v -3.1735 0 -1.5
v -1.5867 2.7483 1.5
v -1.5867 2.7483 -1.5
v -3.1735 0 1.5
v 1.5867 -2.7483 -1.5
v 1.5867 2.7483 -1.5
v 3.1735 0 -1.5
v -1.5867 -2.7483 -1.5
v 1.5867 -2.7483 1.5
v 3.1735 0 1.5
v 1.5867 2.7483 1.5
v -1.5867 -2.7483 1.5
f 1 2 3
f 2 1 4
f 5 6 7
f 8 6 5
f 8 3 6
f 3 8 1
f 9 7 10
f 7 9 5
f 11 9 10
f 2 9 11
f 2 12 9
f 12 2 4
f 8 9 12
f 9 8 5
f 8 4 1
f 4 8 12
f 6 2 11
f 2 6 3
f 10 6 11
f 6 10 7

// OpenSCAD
$fn = 50;

difference() {
	union() {
		translate(v = [0, 0, 0]) {
			rotate(a = [0, 0, 0]) {
				difference() {
					union() {
						translate(v = [0, 0, -1.5]) {
							linear_extrude(height = 3) {
								polygon(points = [[3.1734999999999998, 0.0], [1.5867500000000003, 2.7483316189099156], [-1.5867499999999992, 2.748331618909916], [-3.1734999999999998, 3.886416617094125e-16], [-1.5867500000000012, -2.748331618909915], [1.5867499999999977, -2.748331618909917]]);
							}
						}
					}
					union();
				}
			}
		}
	}
	union();
}
